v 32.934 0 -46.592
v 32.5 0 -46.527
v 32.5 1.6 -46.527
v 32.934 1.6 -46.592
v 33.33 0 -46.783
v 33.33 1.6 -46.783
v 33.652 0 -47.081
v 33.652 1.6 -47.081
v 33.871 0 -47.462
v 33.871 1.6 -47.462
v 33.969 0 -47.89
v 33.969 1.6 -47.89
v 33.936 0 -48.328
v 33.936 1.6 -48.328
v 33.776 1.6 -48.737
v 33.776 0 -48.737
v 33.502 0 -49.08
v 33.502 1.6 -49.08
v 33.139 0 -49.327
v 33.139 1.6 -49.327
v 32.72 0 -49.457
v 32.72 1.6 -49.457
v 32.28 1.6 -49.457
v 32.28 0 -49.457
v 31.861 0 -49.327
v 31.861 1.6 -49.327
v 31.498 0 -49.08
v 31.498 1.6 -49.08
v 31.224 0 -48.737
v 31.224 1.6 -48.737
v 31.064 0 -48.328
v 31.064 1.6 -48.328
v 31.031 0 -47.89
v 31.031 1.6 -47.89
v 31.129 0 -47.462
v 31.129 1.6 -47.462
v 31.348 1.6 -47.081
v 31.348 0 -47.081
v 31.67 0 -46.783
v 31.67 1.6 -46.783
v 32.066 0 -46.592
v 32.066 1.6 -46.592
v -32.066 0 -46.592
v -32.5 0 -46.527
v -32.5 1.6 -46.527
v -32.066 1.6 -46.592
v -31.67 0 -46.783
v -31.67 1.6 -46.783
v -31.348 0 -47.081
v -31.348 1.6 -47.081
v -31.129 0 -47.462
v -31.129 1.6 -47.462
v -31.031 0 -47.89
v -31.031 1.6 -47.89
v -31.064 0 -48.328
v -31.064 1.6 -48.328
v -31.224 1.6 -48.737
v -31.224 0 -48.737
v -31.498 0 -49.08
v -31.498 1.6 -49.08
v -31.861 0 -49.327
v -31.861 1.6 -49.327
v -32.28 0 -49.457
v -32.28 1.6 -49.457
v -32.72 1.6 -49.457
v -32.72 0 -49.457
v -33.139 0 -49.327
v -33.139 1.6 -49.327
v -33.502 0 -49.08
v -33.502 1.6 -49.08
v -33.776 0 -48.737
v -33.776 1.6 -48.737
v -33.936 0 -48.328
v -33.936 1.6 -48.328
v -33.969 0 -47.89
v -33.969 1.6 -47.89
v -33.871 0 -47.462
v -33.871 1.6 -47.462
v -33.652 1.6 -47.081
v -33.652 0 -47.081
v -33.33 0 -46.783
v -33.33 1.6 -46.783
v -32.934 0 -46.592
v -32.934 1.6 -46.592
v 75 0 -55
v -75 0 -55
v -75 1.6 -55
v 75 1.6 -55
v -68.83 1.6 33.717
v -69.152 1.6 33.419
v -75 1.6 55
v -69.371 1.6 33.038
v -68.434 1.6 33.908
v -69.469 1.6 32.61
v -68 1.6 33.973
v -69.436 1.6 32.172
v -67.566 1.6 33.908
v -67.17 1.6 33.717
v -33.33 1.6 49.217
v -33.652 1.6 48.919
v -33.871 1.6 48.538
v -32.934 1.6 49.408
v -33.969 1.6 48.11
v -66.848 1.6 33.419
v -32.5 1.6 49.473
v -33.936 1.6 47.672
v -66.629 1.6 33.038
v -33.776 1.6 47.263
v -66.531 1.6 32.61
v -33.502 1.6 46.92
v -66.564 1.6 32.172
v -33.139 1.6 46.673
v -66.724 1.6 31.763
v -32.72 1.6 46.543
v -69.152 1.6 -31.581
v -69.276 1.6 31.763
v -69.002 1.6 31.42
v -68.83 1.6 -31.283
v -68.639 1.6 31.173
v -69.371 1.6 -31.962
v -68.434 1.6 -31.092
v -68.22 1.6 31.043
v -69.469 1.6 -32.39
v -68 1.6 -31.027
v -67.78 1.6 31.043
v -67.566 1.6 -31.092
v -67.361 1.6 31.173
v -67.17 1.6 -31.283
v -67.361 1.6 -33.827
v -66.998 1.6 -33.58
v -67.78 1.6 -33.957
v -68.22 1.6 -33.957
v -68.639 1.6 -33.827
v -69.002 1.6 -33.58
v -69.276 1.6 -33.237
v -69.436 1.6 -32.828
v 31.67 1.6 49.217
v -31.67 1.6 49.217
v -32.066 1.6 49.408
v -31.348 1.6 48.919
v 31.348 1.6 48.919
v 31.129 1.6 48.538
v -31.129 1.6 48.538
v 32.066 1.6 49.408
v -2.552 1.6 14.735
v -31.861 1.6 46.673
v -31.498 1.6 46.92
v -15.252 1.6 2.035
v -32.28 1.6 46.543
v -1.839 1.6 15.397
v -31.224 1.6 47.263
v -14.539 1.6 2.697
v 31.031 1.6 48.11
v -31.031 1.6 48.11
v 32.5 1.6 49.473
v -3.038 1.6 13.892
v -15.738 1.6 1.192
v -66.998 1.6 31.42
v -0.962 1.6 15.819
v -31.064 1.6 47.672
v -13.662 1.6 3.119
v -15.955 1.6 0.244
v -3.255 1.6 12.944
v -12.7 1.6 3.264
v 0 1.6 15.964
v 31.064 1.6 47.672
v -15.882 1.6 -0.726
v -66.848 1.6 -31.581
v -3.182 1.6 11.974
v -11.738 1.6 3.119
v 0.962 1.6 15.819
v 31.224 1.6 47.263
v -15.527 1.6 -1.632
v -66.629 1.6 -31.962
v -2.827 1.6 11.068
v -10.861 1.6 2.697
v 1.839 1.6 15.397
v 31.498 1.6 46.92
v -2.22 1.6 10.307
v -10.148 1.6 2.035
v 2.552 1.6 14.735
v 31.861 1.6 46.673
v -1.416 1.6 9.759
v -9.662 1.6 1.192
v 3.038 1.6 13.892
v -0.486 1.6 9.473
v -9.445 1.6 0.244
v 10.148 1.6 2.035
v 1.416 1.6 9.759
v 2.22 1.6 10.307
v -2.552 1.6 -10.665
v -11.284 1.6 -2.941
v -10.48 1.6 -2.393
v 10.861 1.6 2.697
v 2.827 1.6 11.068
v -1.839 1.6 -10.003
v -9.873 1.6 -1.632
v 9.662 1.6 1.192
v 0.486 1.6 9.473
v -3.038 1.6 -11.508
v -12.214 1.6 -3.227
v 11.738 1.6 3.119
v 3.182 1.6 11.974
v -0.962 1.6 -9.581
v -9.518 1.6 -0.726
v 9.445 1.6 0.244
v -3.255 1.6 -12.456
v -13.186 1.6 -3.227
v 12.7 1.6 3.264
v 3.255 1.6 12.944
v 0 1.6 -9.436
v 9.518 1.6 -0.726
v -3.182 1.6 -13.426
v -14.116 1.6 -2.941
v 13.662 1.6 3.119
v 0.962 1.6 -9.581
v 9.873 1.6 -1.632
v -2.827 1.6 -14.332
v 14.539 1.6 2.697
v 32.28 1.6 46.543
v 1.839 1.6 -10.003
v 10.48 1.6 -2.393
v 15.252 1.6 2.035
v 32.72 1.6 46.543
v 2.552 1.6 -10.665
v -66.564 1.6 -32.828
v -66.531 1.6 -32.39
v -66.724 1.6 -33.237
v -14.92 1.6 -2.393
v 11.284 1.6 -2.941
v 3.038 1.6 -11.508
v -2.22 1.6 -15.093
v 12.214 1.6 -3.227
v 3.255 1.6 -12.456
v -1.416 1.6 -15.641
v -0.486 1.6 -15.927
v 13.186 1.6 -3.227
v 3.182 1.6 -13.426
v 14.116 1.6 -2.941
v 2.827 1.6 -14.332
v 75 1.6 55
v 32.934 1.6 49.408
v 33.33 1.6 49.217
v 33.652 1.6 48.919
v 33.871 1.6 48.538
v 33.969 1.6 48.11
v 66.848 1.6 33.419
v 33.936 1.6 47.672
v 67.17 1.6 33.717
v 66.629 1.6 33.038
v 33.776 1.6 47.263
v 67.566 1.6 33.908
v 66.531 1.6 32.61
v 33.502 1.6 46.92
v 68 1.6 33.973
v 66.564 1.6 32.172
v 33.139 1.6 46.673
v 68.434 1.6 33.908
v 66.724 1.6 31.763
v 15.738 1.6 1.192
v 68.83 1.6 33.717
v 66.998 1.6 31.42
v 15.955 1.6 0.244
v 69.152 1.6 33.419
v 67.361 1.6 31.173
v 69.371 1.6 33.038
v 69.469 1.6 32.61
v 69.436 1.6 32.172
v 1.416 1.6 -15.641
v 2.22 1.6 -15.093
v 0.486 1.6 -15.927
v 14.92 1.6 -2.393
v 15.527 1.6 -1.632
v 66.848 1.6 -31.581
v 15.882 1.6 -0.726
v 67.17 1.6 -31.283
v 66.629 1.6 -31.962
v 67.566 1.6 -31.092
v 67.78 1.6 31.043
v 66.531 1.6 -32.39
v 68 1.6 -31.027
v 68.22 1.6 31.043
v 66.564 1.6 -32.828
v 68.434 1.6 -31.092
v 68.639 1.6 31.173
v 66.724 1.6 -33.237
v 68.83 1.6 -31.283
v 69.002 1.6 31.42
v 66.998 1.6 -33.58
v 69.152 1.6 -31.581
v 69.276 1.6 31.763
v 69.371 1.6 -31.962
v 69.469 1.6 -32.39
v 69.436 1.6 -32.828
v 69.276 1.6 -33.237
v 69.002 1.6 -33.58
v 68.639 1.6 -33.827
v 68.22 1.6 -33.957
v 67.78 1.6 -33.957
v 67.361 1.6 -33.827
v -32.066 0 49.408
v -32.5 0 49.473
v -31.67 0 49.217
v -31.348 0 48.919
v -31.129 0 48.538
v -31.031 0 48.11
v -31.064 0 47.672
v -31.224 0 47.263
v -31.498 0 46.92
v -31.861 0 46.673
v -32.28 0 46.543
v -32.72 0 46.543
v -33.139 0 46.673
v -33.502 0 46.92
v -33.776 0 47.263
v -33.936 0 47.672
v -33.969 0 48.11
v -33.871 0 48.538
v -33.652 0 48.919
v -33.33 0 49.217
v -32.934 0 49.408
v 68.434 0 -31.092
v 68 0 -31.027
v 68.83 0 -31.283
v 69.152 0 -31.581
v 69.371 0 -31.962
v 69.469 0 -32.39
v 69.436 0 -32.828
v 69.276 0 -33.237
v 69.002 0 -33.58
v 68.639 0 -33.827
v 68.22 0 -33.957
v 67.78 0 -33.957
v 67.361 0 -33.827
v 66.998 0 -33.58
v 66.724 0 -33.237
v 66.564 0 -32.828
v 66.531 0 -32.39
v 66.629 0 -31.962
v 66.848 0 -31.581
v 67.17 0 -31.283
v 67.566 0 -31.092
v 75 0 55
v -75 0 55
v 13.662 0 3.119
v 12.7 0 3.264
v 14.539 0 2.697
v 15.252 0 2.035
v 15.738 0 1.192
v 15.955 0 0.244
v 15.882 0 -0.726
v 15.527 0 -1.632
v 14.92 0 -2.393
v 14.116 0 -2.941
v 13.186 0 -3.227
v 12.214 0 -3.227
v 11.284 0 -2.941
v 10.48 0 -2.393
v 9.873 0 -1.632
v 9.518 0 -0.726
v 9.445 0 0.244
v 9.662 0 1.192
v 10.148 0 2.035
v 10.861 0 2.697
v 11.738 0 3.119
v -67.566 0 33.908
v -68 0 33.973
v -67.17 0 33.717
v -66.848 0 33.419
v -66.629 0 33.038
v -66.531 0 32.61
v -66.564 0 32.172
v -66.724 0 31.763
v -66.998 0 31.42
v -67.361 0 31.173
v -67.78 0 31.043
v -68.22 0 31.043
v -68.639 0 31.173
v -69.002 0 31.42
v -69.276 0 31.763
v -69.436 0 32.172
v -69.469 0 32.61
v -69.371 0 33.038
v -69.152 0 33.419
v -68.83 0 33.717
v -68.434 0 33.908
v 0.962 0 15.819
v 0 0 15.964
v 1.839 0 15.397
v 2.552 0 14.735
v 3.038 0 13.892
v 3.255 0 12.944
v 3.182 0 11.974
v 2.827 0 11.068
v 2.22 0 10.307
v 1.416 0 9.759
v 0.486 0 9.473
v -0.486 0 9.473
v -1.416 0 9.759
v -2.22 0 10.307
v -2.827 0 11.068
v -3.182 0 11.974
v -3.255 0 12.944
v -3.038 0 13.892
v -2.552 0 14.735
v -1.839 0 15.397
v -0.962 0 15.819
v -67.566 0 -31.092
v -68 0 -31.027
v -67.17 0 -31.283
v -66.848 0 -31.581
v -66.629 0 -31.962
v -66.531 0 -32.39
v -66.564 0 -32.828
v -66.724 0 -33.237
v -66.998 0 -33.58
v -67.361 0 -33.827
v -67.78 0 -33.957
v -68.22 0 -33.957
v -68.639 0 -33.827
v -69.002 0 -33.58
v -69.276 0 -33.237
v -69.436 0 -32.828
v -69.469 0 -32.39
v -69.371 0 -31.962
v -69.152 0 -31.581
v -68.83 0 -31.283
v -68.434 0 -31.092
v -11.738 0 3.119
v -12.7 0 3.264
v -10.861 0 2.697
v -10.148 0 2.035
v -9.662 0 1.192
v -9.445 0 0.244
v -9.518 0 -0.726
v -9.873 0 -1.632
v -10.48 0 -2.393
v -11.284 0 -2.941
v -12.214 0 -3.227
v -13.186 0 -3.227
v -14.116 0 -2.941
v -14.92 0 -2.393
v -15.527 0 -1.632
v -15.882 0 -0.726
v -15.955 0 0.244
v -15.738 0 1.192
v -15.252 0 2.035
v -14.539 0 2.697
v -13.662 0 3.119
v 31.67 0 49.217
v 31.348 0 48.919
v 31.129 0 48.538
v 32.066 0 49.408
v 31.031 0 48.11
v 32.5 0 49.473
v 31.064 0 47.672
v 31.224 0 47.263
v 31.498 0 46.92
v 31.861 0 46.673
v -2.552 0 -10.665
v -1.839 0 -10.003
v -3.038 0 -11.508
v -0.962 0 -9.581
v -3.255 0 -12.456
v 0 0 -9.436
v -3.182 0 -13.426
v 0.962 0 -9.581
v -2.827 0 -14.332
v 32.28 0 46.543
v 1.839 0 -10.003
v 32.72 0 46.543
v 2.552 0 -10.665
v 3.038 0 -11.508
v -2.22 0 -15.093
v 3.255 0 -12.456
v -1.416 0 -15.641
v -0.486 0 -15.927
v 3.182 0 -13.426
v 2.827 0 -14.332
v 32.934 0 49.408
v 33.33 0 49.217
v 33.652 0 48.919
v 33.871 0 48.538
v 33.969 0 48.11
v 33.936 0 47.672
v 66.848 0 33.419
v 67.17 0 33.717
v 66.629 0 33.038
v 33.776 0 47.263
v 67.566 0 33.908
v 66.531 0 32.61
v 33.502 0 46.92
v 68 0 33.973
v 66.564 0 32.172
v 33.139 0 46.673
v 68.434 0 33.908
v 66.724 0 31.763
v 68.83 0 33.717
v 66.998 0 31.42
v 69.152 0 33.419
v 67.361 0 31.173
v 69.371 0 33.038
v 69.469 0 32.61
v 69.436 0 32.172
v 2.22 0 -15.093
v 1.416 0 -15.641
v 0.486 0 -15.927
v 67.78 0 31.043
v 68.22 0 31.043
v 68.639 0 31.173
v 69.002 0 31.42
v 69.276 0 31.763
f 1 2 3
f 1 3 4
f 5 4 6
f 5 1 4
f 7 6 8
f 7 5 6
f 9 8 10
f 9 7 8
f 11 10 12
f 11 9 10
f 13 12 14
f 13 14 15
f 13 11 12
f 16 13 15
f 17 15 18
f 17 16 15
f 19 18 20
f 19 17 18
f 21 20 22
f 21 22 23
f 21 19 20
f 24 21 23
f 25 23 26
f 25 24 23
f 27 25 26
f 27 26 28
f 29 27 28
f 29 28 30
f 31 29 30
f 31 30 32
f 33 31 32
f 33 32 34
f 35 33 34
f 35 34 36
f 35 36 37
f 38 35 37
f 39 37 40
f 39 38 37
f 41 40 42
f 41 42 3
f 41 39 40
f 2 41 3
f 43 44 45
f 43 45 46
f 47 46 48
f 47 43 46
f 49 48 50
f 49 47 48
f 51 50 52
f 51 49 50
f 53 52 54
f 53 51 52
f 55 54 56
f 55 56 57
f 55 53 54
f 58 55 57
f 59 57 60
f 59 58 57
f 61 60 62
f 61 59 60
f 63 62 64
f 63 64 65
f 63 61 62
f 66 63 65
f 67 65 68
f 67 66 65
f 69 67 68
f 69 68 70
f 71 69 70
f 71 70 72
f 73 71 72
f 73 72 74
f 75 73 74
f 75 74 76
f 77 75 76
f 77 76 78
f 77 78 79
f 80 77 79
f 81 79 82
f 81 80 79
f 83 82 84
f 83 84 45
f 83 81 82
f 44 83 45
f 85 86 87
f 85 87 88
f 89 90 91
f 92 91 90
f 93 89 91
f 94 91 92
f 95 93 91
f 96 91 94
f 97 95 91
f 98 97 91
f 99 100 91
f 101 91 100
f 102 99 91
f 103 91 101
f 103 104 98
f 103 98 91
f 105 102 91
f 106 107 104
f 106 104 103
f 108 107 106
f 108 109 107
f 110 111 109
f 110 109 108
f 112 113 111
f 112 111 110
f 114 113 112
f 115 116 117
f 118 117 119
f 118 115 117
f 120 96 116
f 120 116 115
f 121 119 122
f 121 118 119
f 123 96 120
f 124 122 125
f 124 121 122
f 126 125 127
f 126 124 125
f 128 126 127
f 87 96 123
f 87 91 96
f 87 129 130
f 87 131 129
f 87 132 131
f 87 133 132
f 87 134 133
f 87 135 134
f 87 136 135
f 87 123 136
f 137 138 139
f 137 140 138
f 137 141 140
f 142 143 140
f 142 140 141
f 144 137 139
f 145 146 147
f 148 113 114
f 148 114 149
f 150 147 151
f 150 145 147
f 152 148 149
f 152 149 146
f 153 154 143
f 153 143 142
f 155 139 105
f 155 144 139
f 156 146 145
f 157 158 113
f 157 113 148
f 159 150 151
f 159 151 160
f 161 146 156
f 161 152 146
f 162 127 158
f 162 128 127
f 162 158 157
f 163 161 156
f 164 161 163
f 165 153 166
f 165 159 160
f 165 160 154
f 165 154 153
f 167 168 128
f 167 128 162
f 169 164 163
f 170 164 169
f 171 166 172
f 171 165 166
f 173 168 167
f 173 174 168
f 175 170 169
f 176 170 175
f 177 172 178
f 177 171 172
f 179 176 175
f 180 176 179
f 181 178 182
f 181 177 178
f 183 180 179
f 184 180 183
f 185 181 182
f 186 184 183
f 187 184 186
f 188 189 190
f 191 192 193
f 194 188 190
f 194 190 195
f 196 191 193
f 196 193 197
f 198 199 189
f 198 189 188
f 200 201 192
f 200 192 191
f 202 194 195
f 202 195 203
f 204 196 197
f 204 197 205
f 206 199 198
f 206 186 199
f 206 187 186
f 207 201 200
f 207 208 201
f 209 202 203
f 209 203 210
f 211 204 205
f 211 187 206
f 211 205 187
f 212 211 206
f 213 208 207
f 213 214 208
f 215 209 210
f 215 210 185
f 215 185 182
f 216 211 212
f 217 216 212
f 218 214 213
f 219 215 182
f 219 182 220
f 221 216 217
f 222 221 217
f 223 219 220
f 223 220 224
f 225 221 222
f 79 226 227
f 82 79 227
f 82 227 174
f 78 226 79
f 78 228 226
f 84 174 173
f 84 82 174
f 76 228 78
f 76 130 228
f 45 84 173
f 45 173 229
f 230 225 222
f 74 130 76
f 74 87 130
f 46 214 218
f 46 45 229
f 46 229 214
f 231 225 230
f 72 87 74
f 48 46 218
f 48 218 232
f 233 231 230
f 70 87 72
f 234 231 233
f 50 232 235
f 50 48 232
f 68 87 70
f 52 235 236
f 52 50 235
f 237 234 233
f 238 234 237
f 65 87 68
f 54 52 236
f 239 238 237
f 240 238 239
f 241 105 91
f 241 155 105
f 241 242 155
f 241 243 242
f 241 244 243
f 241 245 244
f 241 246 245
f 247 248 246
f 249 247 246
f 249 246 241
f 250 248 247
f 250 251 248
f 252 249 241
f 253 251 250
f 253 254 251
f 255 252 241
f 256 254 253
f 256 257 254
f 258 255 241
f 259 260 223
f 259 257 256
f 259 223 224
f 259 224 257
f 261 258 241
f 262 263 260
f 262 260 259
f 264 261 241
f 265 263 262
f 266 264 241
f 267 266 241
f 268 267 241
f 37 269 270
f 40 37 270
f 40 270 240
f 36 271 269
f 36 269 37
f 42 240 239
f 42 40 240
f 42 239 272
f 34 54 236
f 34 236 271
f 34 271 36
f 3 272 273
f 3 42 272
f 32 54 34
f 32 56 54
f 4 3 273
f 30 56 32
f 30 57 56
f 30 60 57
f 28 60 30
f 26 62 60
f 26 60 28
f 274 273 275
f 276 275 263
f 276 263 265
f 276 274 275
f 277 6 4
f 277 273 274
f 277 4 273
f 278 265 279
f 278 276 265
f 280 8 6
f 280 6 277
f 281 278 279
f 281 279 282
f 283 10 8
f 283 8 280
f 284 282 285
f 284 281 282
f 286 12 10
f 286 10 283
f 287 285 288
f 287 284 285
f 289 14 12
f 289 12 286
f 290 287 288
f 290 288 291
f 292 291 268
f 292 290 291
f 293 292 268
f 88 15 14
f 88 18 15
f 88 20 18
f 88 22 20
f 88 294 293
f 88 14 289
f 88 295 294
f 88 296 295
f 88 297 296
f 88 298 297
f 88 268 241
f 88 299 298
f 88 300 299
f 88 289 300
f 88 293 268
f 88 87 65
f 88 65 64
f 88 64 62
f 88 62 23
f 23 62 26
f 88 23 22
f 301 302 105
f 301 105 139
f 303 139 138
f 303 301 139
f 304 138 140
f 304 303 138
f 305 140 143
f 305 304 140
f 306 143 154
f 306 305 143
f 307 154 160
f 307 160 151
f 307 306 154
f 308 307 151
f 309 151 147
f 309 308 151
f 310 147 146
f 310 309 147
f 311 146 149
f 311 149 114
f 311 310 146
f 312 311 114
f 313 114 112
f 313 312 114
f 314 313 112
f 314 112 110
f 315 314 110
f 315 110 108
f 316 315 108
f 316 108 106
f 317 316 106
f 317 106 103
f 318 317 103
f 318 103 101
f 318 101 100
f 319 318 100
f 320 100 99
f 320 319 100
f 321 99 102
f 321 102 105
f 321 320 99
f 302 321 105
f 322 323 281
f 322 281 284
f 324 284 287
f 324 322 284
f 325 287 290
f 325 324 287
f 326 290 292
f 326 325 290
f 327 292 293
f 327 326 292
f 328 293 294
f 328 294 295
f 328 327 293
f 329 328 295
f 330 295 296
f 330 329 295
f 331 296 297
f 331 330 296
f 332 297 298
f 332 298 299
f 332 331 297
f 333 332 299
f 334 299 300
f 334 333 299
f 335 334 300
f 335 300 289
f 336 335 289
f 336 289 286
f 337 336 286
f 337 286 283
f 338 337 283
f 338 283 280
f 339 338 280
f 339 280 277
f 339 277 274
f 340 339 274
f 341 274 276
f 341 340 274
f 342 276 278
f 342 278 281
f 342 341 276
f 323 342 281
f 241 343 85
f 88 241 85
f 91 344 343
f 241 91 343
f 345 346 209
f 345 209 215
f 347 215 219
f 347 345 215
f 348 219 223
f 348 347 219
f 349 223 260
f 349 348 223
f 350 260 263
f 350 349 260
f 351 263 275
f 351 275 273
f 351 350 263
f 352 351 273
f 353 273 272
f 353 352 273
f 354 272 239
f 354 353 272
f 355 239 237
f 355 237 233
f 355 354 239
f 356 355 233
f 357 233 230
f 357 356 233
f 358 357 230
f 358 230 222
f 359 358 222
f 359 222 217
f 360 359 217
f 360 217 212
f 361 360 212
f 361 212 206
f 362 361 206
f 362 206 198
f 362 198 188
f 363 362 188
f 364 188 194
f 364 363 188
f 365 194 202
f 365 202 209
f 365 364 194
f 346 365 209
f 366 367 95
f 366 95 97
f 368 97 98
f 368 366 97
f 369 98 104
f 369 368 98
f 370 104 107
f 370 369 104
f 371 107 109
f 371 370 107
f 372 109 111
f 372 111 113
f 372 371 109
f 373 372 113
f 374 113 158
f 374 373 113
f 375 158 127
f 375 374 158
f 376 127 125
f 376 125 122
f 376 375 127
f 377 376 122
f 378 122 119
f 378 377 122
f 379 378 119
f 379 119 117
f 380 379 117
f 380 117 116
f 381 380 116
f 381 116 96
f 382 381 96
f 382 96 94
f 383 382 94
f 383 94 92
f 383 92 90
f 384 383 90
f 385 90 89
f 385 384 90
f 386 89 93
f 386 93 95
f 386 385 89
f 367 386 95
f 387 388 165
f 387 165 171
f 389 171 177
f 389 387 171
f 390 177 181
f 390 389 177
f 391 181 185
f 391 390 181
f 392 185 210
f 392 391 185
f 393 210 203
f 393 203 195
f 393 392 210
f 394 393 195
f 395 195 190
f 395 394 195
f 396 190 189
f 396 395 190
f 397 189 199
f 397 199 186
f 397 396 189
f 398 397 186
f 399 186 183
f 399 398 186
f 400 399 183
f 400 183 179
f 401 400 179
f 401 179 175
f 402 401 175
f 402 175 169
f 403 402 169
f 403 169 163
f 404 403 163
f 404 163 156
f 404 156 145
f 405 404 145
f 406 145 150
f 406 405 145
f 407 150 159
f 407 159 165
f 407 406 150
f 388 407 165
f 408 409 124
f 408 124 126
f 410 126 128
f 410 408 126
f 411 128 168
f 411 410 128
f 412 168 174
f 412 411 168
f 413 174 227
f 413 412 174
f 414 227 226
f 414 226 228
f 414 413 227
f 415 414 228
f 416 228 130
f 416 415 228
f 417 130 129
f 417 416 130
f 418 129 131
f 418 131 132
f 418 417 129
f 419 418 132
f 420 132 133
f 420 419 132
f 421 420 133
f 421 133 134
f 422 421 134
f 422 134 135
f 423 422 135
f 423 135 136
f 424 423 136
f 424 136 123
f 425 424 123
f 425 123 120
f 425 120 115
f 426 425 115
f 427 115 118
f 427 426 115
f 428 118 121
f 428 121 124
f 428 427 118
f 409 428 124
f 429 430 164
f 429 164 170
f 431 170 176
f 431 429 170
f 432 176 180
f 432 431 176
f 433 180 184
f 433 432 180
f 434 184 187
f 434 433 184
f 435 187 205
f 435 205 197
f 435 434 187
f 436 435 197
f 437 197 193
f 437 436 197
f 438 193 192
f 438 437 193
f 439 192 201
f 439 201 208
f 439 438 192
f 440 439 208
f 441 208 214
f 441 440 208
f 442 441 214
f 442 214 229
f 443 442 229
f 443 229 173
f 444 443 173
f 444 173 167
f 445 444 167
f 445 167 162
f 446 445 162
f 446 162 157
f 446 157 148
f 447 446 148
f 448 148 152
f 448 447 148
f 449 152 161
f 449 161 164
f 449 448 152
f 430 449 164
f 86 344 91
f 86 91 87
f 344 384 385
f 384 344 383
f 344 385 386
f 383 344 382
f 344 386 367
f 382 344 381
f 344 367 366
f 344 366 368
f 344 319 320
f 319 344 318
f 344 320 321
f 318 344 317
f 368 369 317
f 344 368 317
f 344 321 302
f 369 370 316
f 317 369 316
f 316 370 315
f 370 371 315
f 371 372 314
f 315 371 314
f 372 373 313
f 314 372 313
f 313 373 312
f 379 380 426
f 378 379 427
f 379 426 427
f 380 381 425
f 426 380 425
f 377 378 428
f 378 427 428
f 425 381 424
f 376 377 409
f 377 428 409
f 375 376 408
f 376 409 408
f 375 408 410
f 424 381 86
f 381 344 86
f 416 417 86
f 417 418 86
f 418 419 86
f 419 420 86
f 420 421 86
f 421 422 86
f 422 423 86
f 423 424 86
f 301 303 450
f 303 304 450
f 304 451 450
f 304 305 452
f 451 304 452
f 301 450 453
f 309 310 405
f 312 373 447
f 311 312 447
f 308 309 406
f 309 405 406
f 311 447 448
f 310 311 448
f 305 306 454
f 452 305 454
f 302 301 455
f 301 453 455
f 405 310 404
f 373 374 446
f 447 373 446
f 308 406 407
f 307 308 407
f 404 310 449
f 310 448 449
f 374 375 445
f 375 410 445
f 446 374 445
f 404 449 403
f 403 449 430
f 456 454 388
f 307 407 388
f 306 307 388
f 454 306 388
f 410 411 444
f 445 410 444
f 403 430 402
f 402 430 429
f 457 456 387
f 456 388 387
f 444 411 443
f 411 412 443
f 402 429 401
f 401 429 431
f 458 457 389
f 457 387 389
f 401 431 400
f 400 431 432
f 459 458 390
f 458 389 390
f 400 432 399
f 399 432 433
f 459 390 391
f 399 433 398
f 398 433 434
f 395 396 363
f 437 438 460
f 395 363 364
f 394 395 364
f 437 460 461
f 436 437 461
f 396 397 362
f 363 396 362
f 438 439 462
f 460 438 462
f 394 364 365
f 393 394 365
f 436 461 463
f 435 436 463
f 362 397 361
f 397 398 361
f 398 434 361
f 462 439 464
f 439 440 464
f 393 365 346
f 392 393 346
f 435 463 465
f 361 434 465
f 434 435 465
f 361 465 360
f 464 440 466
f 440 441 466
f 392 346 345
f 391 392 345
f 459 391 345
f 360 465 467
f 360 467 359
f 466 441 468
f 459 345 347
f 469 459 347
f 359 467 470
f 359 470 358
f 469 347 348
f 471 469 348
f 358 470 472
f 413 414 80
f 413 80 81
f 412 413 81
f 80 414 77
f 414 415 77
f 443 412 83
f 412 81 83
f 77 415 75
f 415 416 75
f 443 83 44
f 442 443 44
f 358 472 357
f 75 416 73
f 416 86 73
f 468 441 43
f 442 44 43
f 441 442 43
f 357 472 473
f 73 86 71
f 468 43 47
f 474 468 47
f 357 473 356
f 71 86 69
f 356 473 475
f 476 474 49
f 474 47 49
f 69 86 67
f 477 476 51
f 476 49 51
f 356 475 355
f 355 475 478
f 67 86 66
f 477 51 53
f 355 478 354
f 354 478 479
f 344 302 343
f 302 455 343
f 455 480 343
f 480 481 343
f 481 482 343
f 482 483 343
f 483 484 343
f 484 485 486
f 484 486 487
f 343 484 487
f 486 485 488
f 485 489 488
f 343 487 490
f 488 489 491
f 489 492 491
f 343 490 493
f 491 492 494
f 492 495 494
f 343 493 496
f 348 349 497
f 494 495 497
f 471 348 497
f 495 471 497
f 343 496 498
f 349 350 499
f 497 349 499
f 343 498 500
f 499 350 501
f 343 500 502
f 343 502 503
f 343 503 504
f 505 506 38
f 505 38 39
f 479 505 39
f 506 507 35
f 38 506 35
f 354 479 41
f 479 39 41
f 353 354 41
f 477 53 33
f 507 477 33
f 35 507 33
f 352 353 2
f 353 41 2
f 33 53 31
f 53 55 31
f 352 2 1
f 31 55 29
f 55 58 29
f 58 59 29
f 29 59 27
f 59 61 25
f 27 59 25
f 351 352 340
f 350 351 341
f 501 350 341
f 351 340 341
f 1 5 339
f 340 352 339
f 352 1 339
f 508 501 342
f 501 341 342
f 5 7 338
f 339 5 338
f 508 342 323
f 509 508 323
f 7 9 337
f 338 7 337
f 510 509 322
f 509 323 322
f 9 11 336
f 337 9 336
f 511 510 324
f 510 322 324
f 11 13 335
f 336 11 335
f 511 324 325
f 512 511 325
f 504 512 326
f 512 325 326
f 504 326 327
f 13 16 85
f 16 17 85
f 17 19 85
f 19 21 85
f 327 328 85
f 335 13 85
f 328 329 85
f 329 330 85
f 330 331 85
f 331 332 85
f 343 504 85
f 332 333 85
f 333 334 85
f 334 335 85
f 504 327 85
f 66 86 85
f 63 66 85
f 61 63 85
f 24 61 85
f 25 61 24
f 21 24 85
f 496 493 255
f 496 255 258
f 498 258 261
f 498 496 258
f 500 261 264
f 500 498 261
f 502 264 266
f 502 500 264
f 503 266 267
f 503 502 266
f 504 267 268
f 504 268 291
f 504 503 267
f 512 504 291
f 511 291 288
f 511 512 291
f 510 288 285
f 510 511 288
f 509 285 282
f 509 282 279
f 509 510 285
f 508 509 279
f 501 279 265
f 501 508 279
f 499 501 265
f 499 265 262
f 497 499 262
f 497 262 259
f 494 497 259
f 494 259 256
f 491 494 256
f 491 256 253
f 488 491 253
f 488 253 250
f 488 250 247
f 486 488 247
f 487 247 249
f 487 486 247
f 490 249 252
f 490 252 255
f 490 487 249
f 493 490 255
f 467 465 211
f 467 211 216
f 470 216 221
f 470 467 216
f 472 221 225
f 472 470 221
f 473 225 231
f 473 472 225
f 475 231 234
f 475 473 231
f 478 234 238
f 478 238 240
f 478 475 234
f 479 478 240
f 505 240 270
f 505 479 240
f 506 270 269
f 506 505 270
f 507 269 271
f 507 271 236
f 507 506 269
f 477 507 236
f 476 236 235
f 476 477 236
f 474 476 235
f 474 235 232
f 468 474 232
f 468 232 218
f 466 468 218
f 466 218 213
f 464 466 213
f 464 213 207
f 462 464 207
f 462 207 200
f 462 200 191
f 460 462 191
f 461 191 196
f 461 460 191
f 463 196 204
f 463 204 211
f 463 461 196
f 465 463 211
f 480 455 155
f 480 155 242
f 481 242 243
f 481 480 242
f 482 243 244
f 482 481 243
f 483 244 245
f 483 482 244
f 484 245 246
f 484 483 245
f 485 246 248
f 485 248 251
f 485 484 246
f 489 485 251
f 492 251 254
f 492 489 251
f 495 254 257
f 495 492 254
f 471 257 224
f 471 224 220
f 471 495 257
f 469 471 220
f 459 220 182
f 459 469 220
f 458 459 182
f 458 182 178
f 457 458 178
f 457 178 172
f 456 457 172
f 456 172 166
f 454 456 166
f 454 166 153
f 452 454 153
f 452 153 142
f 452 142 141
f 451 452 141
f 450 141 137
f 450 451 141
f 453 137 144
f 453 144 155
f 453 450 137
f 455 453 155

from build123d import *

# Parameters (mm, degrees)
SKETCH1_W           = 150
SKETCH1_H           = 110
SKETCH1_R           = 3.2639
SKETCH1_R_2         = 1.4732
BOSS_EXTRUDE1_DEPTH = 1.6


with BuildPart() as part:
    # Sketch1 → Boss-Extrude1 (new body)
    with BuildSketch(Plane(origin=(0, 0, 0), x_dir=(1, 0, 0), z_dir=(0, 1, 0))):
        Rectangle(SKETCH1_W, SKETCH1_H)
        with Locations(Location((0, 12.7, 0), (0, 0, 270))):
            Circle(SKETCH1_R, mode=Mode.SUBTRACT)
        with Locations(Location((12.7, 0, 0), (0, 0, 270))):
            Circle(SKETCH1_R, mode=Mode.SUBTRACT)
        with Locations(Location((0, -12.7, 0), (0, 0, 270))):
            Circle(SKETCH1_R, mode=Mode.SUBTRACT)
        with Locations(Location((-12.7, 0, 0), (0, 0, 270))):
            Circle(SKETCH1_R, mode=Mode.SUBTRACT)
        with Locations(Location((-32.5, 48, 0), (0, 0, 270))):
            Circle(SKETCH1_R_2, mode=Mode.SUBTRACT)
        with Locations(Location((32.5, 48, 0), (0, 0, 270))):
            Circle(SKETCH1_R_2, mode=Mode.SUBTRACT)
        with Locations(Location((32.5, -48, 0), (0, 0, 270))):
            Circle(SKETCH1_R_2, mode=Mode.SUBTRACT)
        with Locations(Location((-32.5, -48, 0), (0, 0, 270))):
            Circle(SKETCH1_R_2, mode=Mode.SUBTRACT)
        with Locations(Location((-68, 32.5, 0), (0, 0, 270))):
            Circle(SKETCH1_R_2, mode=Mode.SUBTRACT)
        with Locations(Location((68, 32.5, 0), (0, 0, 270))):
            Circle(SKETCH1_R_2, mode=Mode.SUBTRACT)
        with Locations(Location((68, -32.5, 0), (0, 0, 270))):
            Circle(SKETCH1_R_2, mode=Mode.SUBTRACT)
        with Locations(Location((-68, -32.5, 0), (0, 0, 270))):
            Circle(SKETCH1_R_2, mode=Mode.SUBTRACT)
    extrude(amount=BOSS_EXTRUDE1_DEPTH)


solid = part.part
